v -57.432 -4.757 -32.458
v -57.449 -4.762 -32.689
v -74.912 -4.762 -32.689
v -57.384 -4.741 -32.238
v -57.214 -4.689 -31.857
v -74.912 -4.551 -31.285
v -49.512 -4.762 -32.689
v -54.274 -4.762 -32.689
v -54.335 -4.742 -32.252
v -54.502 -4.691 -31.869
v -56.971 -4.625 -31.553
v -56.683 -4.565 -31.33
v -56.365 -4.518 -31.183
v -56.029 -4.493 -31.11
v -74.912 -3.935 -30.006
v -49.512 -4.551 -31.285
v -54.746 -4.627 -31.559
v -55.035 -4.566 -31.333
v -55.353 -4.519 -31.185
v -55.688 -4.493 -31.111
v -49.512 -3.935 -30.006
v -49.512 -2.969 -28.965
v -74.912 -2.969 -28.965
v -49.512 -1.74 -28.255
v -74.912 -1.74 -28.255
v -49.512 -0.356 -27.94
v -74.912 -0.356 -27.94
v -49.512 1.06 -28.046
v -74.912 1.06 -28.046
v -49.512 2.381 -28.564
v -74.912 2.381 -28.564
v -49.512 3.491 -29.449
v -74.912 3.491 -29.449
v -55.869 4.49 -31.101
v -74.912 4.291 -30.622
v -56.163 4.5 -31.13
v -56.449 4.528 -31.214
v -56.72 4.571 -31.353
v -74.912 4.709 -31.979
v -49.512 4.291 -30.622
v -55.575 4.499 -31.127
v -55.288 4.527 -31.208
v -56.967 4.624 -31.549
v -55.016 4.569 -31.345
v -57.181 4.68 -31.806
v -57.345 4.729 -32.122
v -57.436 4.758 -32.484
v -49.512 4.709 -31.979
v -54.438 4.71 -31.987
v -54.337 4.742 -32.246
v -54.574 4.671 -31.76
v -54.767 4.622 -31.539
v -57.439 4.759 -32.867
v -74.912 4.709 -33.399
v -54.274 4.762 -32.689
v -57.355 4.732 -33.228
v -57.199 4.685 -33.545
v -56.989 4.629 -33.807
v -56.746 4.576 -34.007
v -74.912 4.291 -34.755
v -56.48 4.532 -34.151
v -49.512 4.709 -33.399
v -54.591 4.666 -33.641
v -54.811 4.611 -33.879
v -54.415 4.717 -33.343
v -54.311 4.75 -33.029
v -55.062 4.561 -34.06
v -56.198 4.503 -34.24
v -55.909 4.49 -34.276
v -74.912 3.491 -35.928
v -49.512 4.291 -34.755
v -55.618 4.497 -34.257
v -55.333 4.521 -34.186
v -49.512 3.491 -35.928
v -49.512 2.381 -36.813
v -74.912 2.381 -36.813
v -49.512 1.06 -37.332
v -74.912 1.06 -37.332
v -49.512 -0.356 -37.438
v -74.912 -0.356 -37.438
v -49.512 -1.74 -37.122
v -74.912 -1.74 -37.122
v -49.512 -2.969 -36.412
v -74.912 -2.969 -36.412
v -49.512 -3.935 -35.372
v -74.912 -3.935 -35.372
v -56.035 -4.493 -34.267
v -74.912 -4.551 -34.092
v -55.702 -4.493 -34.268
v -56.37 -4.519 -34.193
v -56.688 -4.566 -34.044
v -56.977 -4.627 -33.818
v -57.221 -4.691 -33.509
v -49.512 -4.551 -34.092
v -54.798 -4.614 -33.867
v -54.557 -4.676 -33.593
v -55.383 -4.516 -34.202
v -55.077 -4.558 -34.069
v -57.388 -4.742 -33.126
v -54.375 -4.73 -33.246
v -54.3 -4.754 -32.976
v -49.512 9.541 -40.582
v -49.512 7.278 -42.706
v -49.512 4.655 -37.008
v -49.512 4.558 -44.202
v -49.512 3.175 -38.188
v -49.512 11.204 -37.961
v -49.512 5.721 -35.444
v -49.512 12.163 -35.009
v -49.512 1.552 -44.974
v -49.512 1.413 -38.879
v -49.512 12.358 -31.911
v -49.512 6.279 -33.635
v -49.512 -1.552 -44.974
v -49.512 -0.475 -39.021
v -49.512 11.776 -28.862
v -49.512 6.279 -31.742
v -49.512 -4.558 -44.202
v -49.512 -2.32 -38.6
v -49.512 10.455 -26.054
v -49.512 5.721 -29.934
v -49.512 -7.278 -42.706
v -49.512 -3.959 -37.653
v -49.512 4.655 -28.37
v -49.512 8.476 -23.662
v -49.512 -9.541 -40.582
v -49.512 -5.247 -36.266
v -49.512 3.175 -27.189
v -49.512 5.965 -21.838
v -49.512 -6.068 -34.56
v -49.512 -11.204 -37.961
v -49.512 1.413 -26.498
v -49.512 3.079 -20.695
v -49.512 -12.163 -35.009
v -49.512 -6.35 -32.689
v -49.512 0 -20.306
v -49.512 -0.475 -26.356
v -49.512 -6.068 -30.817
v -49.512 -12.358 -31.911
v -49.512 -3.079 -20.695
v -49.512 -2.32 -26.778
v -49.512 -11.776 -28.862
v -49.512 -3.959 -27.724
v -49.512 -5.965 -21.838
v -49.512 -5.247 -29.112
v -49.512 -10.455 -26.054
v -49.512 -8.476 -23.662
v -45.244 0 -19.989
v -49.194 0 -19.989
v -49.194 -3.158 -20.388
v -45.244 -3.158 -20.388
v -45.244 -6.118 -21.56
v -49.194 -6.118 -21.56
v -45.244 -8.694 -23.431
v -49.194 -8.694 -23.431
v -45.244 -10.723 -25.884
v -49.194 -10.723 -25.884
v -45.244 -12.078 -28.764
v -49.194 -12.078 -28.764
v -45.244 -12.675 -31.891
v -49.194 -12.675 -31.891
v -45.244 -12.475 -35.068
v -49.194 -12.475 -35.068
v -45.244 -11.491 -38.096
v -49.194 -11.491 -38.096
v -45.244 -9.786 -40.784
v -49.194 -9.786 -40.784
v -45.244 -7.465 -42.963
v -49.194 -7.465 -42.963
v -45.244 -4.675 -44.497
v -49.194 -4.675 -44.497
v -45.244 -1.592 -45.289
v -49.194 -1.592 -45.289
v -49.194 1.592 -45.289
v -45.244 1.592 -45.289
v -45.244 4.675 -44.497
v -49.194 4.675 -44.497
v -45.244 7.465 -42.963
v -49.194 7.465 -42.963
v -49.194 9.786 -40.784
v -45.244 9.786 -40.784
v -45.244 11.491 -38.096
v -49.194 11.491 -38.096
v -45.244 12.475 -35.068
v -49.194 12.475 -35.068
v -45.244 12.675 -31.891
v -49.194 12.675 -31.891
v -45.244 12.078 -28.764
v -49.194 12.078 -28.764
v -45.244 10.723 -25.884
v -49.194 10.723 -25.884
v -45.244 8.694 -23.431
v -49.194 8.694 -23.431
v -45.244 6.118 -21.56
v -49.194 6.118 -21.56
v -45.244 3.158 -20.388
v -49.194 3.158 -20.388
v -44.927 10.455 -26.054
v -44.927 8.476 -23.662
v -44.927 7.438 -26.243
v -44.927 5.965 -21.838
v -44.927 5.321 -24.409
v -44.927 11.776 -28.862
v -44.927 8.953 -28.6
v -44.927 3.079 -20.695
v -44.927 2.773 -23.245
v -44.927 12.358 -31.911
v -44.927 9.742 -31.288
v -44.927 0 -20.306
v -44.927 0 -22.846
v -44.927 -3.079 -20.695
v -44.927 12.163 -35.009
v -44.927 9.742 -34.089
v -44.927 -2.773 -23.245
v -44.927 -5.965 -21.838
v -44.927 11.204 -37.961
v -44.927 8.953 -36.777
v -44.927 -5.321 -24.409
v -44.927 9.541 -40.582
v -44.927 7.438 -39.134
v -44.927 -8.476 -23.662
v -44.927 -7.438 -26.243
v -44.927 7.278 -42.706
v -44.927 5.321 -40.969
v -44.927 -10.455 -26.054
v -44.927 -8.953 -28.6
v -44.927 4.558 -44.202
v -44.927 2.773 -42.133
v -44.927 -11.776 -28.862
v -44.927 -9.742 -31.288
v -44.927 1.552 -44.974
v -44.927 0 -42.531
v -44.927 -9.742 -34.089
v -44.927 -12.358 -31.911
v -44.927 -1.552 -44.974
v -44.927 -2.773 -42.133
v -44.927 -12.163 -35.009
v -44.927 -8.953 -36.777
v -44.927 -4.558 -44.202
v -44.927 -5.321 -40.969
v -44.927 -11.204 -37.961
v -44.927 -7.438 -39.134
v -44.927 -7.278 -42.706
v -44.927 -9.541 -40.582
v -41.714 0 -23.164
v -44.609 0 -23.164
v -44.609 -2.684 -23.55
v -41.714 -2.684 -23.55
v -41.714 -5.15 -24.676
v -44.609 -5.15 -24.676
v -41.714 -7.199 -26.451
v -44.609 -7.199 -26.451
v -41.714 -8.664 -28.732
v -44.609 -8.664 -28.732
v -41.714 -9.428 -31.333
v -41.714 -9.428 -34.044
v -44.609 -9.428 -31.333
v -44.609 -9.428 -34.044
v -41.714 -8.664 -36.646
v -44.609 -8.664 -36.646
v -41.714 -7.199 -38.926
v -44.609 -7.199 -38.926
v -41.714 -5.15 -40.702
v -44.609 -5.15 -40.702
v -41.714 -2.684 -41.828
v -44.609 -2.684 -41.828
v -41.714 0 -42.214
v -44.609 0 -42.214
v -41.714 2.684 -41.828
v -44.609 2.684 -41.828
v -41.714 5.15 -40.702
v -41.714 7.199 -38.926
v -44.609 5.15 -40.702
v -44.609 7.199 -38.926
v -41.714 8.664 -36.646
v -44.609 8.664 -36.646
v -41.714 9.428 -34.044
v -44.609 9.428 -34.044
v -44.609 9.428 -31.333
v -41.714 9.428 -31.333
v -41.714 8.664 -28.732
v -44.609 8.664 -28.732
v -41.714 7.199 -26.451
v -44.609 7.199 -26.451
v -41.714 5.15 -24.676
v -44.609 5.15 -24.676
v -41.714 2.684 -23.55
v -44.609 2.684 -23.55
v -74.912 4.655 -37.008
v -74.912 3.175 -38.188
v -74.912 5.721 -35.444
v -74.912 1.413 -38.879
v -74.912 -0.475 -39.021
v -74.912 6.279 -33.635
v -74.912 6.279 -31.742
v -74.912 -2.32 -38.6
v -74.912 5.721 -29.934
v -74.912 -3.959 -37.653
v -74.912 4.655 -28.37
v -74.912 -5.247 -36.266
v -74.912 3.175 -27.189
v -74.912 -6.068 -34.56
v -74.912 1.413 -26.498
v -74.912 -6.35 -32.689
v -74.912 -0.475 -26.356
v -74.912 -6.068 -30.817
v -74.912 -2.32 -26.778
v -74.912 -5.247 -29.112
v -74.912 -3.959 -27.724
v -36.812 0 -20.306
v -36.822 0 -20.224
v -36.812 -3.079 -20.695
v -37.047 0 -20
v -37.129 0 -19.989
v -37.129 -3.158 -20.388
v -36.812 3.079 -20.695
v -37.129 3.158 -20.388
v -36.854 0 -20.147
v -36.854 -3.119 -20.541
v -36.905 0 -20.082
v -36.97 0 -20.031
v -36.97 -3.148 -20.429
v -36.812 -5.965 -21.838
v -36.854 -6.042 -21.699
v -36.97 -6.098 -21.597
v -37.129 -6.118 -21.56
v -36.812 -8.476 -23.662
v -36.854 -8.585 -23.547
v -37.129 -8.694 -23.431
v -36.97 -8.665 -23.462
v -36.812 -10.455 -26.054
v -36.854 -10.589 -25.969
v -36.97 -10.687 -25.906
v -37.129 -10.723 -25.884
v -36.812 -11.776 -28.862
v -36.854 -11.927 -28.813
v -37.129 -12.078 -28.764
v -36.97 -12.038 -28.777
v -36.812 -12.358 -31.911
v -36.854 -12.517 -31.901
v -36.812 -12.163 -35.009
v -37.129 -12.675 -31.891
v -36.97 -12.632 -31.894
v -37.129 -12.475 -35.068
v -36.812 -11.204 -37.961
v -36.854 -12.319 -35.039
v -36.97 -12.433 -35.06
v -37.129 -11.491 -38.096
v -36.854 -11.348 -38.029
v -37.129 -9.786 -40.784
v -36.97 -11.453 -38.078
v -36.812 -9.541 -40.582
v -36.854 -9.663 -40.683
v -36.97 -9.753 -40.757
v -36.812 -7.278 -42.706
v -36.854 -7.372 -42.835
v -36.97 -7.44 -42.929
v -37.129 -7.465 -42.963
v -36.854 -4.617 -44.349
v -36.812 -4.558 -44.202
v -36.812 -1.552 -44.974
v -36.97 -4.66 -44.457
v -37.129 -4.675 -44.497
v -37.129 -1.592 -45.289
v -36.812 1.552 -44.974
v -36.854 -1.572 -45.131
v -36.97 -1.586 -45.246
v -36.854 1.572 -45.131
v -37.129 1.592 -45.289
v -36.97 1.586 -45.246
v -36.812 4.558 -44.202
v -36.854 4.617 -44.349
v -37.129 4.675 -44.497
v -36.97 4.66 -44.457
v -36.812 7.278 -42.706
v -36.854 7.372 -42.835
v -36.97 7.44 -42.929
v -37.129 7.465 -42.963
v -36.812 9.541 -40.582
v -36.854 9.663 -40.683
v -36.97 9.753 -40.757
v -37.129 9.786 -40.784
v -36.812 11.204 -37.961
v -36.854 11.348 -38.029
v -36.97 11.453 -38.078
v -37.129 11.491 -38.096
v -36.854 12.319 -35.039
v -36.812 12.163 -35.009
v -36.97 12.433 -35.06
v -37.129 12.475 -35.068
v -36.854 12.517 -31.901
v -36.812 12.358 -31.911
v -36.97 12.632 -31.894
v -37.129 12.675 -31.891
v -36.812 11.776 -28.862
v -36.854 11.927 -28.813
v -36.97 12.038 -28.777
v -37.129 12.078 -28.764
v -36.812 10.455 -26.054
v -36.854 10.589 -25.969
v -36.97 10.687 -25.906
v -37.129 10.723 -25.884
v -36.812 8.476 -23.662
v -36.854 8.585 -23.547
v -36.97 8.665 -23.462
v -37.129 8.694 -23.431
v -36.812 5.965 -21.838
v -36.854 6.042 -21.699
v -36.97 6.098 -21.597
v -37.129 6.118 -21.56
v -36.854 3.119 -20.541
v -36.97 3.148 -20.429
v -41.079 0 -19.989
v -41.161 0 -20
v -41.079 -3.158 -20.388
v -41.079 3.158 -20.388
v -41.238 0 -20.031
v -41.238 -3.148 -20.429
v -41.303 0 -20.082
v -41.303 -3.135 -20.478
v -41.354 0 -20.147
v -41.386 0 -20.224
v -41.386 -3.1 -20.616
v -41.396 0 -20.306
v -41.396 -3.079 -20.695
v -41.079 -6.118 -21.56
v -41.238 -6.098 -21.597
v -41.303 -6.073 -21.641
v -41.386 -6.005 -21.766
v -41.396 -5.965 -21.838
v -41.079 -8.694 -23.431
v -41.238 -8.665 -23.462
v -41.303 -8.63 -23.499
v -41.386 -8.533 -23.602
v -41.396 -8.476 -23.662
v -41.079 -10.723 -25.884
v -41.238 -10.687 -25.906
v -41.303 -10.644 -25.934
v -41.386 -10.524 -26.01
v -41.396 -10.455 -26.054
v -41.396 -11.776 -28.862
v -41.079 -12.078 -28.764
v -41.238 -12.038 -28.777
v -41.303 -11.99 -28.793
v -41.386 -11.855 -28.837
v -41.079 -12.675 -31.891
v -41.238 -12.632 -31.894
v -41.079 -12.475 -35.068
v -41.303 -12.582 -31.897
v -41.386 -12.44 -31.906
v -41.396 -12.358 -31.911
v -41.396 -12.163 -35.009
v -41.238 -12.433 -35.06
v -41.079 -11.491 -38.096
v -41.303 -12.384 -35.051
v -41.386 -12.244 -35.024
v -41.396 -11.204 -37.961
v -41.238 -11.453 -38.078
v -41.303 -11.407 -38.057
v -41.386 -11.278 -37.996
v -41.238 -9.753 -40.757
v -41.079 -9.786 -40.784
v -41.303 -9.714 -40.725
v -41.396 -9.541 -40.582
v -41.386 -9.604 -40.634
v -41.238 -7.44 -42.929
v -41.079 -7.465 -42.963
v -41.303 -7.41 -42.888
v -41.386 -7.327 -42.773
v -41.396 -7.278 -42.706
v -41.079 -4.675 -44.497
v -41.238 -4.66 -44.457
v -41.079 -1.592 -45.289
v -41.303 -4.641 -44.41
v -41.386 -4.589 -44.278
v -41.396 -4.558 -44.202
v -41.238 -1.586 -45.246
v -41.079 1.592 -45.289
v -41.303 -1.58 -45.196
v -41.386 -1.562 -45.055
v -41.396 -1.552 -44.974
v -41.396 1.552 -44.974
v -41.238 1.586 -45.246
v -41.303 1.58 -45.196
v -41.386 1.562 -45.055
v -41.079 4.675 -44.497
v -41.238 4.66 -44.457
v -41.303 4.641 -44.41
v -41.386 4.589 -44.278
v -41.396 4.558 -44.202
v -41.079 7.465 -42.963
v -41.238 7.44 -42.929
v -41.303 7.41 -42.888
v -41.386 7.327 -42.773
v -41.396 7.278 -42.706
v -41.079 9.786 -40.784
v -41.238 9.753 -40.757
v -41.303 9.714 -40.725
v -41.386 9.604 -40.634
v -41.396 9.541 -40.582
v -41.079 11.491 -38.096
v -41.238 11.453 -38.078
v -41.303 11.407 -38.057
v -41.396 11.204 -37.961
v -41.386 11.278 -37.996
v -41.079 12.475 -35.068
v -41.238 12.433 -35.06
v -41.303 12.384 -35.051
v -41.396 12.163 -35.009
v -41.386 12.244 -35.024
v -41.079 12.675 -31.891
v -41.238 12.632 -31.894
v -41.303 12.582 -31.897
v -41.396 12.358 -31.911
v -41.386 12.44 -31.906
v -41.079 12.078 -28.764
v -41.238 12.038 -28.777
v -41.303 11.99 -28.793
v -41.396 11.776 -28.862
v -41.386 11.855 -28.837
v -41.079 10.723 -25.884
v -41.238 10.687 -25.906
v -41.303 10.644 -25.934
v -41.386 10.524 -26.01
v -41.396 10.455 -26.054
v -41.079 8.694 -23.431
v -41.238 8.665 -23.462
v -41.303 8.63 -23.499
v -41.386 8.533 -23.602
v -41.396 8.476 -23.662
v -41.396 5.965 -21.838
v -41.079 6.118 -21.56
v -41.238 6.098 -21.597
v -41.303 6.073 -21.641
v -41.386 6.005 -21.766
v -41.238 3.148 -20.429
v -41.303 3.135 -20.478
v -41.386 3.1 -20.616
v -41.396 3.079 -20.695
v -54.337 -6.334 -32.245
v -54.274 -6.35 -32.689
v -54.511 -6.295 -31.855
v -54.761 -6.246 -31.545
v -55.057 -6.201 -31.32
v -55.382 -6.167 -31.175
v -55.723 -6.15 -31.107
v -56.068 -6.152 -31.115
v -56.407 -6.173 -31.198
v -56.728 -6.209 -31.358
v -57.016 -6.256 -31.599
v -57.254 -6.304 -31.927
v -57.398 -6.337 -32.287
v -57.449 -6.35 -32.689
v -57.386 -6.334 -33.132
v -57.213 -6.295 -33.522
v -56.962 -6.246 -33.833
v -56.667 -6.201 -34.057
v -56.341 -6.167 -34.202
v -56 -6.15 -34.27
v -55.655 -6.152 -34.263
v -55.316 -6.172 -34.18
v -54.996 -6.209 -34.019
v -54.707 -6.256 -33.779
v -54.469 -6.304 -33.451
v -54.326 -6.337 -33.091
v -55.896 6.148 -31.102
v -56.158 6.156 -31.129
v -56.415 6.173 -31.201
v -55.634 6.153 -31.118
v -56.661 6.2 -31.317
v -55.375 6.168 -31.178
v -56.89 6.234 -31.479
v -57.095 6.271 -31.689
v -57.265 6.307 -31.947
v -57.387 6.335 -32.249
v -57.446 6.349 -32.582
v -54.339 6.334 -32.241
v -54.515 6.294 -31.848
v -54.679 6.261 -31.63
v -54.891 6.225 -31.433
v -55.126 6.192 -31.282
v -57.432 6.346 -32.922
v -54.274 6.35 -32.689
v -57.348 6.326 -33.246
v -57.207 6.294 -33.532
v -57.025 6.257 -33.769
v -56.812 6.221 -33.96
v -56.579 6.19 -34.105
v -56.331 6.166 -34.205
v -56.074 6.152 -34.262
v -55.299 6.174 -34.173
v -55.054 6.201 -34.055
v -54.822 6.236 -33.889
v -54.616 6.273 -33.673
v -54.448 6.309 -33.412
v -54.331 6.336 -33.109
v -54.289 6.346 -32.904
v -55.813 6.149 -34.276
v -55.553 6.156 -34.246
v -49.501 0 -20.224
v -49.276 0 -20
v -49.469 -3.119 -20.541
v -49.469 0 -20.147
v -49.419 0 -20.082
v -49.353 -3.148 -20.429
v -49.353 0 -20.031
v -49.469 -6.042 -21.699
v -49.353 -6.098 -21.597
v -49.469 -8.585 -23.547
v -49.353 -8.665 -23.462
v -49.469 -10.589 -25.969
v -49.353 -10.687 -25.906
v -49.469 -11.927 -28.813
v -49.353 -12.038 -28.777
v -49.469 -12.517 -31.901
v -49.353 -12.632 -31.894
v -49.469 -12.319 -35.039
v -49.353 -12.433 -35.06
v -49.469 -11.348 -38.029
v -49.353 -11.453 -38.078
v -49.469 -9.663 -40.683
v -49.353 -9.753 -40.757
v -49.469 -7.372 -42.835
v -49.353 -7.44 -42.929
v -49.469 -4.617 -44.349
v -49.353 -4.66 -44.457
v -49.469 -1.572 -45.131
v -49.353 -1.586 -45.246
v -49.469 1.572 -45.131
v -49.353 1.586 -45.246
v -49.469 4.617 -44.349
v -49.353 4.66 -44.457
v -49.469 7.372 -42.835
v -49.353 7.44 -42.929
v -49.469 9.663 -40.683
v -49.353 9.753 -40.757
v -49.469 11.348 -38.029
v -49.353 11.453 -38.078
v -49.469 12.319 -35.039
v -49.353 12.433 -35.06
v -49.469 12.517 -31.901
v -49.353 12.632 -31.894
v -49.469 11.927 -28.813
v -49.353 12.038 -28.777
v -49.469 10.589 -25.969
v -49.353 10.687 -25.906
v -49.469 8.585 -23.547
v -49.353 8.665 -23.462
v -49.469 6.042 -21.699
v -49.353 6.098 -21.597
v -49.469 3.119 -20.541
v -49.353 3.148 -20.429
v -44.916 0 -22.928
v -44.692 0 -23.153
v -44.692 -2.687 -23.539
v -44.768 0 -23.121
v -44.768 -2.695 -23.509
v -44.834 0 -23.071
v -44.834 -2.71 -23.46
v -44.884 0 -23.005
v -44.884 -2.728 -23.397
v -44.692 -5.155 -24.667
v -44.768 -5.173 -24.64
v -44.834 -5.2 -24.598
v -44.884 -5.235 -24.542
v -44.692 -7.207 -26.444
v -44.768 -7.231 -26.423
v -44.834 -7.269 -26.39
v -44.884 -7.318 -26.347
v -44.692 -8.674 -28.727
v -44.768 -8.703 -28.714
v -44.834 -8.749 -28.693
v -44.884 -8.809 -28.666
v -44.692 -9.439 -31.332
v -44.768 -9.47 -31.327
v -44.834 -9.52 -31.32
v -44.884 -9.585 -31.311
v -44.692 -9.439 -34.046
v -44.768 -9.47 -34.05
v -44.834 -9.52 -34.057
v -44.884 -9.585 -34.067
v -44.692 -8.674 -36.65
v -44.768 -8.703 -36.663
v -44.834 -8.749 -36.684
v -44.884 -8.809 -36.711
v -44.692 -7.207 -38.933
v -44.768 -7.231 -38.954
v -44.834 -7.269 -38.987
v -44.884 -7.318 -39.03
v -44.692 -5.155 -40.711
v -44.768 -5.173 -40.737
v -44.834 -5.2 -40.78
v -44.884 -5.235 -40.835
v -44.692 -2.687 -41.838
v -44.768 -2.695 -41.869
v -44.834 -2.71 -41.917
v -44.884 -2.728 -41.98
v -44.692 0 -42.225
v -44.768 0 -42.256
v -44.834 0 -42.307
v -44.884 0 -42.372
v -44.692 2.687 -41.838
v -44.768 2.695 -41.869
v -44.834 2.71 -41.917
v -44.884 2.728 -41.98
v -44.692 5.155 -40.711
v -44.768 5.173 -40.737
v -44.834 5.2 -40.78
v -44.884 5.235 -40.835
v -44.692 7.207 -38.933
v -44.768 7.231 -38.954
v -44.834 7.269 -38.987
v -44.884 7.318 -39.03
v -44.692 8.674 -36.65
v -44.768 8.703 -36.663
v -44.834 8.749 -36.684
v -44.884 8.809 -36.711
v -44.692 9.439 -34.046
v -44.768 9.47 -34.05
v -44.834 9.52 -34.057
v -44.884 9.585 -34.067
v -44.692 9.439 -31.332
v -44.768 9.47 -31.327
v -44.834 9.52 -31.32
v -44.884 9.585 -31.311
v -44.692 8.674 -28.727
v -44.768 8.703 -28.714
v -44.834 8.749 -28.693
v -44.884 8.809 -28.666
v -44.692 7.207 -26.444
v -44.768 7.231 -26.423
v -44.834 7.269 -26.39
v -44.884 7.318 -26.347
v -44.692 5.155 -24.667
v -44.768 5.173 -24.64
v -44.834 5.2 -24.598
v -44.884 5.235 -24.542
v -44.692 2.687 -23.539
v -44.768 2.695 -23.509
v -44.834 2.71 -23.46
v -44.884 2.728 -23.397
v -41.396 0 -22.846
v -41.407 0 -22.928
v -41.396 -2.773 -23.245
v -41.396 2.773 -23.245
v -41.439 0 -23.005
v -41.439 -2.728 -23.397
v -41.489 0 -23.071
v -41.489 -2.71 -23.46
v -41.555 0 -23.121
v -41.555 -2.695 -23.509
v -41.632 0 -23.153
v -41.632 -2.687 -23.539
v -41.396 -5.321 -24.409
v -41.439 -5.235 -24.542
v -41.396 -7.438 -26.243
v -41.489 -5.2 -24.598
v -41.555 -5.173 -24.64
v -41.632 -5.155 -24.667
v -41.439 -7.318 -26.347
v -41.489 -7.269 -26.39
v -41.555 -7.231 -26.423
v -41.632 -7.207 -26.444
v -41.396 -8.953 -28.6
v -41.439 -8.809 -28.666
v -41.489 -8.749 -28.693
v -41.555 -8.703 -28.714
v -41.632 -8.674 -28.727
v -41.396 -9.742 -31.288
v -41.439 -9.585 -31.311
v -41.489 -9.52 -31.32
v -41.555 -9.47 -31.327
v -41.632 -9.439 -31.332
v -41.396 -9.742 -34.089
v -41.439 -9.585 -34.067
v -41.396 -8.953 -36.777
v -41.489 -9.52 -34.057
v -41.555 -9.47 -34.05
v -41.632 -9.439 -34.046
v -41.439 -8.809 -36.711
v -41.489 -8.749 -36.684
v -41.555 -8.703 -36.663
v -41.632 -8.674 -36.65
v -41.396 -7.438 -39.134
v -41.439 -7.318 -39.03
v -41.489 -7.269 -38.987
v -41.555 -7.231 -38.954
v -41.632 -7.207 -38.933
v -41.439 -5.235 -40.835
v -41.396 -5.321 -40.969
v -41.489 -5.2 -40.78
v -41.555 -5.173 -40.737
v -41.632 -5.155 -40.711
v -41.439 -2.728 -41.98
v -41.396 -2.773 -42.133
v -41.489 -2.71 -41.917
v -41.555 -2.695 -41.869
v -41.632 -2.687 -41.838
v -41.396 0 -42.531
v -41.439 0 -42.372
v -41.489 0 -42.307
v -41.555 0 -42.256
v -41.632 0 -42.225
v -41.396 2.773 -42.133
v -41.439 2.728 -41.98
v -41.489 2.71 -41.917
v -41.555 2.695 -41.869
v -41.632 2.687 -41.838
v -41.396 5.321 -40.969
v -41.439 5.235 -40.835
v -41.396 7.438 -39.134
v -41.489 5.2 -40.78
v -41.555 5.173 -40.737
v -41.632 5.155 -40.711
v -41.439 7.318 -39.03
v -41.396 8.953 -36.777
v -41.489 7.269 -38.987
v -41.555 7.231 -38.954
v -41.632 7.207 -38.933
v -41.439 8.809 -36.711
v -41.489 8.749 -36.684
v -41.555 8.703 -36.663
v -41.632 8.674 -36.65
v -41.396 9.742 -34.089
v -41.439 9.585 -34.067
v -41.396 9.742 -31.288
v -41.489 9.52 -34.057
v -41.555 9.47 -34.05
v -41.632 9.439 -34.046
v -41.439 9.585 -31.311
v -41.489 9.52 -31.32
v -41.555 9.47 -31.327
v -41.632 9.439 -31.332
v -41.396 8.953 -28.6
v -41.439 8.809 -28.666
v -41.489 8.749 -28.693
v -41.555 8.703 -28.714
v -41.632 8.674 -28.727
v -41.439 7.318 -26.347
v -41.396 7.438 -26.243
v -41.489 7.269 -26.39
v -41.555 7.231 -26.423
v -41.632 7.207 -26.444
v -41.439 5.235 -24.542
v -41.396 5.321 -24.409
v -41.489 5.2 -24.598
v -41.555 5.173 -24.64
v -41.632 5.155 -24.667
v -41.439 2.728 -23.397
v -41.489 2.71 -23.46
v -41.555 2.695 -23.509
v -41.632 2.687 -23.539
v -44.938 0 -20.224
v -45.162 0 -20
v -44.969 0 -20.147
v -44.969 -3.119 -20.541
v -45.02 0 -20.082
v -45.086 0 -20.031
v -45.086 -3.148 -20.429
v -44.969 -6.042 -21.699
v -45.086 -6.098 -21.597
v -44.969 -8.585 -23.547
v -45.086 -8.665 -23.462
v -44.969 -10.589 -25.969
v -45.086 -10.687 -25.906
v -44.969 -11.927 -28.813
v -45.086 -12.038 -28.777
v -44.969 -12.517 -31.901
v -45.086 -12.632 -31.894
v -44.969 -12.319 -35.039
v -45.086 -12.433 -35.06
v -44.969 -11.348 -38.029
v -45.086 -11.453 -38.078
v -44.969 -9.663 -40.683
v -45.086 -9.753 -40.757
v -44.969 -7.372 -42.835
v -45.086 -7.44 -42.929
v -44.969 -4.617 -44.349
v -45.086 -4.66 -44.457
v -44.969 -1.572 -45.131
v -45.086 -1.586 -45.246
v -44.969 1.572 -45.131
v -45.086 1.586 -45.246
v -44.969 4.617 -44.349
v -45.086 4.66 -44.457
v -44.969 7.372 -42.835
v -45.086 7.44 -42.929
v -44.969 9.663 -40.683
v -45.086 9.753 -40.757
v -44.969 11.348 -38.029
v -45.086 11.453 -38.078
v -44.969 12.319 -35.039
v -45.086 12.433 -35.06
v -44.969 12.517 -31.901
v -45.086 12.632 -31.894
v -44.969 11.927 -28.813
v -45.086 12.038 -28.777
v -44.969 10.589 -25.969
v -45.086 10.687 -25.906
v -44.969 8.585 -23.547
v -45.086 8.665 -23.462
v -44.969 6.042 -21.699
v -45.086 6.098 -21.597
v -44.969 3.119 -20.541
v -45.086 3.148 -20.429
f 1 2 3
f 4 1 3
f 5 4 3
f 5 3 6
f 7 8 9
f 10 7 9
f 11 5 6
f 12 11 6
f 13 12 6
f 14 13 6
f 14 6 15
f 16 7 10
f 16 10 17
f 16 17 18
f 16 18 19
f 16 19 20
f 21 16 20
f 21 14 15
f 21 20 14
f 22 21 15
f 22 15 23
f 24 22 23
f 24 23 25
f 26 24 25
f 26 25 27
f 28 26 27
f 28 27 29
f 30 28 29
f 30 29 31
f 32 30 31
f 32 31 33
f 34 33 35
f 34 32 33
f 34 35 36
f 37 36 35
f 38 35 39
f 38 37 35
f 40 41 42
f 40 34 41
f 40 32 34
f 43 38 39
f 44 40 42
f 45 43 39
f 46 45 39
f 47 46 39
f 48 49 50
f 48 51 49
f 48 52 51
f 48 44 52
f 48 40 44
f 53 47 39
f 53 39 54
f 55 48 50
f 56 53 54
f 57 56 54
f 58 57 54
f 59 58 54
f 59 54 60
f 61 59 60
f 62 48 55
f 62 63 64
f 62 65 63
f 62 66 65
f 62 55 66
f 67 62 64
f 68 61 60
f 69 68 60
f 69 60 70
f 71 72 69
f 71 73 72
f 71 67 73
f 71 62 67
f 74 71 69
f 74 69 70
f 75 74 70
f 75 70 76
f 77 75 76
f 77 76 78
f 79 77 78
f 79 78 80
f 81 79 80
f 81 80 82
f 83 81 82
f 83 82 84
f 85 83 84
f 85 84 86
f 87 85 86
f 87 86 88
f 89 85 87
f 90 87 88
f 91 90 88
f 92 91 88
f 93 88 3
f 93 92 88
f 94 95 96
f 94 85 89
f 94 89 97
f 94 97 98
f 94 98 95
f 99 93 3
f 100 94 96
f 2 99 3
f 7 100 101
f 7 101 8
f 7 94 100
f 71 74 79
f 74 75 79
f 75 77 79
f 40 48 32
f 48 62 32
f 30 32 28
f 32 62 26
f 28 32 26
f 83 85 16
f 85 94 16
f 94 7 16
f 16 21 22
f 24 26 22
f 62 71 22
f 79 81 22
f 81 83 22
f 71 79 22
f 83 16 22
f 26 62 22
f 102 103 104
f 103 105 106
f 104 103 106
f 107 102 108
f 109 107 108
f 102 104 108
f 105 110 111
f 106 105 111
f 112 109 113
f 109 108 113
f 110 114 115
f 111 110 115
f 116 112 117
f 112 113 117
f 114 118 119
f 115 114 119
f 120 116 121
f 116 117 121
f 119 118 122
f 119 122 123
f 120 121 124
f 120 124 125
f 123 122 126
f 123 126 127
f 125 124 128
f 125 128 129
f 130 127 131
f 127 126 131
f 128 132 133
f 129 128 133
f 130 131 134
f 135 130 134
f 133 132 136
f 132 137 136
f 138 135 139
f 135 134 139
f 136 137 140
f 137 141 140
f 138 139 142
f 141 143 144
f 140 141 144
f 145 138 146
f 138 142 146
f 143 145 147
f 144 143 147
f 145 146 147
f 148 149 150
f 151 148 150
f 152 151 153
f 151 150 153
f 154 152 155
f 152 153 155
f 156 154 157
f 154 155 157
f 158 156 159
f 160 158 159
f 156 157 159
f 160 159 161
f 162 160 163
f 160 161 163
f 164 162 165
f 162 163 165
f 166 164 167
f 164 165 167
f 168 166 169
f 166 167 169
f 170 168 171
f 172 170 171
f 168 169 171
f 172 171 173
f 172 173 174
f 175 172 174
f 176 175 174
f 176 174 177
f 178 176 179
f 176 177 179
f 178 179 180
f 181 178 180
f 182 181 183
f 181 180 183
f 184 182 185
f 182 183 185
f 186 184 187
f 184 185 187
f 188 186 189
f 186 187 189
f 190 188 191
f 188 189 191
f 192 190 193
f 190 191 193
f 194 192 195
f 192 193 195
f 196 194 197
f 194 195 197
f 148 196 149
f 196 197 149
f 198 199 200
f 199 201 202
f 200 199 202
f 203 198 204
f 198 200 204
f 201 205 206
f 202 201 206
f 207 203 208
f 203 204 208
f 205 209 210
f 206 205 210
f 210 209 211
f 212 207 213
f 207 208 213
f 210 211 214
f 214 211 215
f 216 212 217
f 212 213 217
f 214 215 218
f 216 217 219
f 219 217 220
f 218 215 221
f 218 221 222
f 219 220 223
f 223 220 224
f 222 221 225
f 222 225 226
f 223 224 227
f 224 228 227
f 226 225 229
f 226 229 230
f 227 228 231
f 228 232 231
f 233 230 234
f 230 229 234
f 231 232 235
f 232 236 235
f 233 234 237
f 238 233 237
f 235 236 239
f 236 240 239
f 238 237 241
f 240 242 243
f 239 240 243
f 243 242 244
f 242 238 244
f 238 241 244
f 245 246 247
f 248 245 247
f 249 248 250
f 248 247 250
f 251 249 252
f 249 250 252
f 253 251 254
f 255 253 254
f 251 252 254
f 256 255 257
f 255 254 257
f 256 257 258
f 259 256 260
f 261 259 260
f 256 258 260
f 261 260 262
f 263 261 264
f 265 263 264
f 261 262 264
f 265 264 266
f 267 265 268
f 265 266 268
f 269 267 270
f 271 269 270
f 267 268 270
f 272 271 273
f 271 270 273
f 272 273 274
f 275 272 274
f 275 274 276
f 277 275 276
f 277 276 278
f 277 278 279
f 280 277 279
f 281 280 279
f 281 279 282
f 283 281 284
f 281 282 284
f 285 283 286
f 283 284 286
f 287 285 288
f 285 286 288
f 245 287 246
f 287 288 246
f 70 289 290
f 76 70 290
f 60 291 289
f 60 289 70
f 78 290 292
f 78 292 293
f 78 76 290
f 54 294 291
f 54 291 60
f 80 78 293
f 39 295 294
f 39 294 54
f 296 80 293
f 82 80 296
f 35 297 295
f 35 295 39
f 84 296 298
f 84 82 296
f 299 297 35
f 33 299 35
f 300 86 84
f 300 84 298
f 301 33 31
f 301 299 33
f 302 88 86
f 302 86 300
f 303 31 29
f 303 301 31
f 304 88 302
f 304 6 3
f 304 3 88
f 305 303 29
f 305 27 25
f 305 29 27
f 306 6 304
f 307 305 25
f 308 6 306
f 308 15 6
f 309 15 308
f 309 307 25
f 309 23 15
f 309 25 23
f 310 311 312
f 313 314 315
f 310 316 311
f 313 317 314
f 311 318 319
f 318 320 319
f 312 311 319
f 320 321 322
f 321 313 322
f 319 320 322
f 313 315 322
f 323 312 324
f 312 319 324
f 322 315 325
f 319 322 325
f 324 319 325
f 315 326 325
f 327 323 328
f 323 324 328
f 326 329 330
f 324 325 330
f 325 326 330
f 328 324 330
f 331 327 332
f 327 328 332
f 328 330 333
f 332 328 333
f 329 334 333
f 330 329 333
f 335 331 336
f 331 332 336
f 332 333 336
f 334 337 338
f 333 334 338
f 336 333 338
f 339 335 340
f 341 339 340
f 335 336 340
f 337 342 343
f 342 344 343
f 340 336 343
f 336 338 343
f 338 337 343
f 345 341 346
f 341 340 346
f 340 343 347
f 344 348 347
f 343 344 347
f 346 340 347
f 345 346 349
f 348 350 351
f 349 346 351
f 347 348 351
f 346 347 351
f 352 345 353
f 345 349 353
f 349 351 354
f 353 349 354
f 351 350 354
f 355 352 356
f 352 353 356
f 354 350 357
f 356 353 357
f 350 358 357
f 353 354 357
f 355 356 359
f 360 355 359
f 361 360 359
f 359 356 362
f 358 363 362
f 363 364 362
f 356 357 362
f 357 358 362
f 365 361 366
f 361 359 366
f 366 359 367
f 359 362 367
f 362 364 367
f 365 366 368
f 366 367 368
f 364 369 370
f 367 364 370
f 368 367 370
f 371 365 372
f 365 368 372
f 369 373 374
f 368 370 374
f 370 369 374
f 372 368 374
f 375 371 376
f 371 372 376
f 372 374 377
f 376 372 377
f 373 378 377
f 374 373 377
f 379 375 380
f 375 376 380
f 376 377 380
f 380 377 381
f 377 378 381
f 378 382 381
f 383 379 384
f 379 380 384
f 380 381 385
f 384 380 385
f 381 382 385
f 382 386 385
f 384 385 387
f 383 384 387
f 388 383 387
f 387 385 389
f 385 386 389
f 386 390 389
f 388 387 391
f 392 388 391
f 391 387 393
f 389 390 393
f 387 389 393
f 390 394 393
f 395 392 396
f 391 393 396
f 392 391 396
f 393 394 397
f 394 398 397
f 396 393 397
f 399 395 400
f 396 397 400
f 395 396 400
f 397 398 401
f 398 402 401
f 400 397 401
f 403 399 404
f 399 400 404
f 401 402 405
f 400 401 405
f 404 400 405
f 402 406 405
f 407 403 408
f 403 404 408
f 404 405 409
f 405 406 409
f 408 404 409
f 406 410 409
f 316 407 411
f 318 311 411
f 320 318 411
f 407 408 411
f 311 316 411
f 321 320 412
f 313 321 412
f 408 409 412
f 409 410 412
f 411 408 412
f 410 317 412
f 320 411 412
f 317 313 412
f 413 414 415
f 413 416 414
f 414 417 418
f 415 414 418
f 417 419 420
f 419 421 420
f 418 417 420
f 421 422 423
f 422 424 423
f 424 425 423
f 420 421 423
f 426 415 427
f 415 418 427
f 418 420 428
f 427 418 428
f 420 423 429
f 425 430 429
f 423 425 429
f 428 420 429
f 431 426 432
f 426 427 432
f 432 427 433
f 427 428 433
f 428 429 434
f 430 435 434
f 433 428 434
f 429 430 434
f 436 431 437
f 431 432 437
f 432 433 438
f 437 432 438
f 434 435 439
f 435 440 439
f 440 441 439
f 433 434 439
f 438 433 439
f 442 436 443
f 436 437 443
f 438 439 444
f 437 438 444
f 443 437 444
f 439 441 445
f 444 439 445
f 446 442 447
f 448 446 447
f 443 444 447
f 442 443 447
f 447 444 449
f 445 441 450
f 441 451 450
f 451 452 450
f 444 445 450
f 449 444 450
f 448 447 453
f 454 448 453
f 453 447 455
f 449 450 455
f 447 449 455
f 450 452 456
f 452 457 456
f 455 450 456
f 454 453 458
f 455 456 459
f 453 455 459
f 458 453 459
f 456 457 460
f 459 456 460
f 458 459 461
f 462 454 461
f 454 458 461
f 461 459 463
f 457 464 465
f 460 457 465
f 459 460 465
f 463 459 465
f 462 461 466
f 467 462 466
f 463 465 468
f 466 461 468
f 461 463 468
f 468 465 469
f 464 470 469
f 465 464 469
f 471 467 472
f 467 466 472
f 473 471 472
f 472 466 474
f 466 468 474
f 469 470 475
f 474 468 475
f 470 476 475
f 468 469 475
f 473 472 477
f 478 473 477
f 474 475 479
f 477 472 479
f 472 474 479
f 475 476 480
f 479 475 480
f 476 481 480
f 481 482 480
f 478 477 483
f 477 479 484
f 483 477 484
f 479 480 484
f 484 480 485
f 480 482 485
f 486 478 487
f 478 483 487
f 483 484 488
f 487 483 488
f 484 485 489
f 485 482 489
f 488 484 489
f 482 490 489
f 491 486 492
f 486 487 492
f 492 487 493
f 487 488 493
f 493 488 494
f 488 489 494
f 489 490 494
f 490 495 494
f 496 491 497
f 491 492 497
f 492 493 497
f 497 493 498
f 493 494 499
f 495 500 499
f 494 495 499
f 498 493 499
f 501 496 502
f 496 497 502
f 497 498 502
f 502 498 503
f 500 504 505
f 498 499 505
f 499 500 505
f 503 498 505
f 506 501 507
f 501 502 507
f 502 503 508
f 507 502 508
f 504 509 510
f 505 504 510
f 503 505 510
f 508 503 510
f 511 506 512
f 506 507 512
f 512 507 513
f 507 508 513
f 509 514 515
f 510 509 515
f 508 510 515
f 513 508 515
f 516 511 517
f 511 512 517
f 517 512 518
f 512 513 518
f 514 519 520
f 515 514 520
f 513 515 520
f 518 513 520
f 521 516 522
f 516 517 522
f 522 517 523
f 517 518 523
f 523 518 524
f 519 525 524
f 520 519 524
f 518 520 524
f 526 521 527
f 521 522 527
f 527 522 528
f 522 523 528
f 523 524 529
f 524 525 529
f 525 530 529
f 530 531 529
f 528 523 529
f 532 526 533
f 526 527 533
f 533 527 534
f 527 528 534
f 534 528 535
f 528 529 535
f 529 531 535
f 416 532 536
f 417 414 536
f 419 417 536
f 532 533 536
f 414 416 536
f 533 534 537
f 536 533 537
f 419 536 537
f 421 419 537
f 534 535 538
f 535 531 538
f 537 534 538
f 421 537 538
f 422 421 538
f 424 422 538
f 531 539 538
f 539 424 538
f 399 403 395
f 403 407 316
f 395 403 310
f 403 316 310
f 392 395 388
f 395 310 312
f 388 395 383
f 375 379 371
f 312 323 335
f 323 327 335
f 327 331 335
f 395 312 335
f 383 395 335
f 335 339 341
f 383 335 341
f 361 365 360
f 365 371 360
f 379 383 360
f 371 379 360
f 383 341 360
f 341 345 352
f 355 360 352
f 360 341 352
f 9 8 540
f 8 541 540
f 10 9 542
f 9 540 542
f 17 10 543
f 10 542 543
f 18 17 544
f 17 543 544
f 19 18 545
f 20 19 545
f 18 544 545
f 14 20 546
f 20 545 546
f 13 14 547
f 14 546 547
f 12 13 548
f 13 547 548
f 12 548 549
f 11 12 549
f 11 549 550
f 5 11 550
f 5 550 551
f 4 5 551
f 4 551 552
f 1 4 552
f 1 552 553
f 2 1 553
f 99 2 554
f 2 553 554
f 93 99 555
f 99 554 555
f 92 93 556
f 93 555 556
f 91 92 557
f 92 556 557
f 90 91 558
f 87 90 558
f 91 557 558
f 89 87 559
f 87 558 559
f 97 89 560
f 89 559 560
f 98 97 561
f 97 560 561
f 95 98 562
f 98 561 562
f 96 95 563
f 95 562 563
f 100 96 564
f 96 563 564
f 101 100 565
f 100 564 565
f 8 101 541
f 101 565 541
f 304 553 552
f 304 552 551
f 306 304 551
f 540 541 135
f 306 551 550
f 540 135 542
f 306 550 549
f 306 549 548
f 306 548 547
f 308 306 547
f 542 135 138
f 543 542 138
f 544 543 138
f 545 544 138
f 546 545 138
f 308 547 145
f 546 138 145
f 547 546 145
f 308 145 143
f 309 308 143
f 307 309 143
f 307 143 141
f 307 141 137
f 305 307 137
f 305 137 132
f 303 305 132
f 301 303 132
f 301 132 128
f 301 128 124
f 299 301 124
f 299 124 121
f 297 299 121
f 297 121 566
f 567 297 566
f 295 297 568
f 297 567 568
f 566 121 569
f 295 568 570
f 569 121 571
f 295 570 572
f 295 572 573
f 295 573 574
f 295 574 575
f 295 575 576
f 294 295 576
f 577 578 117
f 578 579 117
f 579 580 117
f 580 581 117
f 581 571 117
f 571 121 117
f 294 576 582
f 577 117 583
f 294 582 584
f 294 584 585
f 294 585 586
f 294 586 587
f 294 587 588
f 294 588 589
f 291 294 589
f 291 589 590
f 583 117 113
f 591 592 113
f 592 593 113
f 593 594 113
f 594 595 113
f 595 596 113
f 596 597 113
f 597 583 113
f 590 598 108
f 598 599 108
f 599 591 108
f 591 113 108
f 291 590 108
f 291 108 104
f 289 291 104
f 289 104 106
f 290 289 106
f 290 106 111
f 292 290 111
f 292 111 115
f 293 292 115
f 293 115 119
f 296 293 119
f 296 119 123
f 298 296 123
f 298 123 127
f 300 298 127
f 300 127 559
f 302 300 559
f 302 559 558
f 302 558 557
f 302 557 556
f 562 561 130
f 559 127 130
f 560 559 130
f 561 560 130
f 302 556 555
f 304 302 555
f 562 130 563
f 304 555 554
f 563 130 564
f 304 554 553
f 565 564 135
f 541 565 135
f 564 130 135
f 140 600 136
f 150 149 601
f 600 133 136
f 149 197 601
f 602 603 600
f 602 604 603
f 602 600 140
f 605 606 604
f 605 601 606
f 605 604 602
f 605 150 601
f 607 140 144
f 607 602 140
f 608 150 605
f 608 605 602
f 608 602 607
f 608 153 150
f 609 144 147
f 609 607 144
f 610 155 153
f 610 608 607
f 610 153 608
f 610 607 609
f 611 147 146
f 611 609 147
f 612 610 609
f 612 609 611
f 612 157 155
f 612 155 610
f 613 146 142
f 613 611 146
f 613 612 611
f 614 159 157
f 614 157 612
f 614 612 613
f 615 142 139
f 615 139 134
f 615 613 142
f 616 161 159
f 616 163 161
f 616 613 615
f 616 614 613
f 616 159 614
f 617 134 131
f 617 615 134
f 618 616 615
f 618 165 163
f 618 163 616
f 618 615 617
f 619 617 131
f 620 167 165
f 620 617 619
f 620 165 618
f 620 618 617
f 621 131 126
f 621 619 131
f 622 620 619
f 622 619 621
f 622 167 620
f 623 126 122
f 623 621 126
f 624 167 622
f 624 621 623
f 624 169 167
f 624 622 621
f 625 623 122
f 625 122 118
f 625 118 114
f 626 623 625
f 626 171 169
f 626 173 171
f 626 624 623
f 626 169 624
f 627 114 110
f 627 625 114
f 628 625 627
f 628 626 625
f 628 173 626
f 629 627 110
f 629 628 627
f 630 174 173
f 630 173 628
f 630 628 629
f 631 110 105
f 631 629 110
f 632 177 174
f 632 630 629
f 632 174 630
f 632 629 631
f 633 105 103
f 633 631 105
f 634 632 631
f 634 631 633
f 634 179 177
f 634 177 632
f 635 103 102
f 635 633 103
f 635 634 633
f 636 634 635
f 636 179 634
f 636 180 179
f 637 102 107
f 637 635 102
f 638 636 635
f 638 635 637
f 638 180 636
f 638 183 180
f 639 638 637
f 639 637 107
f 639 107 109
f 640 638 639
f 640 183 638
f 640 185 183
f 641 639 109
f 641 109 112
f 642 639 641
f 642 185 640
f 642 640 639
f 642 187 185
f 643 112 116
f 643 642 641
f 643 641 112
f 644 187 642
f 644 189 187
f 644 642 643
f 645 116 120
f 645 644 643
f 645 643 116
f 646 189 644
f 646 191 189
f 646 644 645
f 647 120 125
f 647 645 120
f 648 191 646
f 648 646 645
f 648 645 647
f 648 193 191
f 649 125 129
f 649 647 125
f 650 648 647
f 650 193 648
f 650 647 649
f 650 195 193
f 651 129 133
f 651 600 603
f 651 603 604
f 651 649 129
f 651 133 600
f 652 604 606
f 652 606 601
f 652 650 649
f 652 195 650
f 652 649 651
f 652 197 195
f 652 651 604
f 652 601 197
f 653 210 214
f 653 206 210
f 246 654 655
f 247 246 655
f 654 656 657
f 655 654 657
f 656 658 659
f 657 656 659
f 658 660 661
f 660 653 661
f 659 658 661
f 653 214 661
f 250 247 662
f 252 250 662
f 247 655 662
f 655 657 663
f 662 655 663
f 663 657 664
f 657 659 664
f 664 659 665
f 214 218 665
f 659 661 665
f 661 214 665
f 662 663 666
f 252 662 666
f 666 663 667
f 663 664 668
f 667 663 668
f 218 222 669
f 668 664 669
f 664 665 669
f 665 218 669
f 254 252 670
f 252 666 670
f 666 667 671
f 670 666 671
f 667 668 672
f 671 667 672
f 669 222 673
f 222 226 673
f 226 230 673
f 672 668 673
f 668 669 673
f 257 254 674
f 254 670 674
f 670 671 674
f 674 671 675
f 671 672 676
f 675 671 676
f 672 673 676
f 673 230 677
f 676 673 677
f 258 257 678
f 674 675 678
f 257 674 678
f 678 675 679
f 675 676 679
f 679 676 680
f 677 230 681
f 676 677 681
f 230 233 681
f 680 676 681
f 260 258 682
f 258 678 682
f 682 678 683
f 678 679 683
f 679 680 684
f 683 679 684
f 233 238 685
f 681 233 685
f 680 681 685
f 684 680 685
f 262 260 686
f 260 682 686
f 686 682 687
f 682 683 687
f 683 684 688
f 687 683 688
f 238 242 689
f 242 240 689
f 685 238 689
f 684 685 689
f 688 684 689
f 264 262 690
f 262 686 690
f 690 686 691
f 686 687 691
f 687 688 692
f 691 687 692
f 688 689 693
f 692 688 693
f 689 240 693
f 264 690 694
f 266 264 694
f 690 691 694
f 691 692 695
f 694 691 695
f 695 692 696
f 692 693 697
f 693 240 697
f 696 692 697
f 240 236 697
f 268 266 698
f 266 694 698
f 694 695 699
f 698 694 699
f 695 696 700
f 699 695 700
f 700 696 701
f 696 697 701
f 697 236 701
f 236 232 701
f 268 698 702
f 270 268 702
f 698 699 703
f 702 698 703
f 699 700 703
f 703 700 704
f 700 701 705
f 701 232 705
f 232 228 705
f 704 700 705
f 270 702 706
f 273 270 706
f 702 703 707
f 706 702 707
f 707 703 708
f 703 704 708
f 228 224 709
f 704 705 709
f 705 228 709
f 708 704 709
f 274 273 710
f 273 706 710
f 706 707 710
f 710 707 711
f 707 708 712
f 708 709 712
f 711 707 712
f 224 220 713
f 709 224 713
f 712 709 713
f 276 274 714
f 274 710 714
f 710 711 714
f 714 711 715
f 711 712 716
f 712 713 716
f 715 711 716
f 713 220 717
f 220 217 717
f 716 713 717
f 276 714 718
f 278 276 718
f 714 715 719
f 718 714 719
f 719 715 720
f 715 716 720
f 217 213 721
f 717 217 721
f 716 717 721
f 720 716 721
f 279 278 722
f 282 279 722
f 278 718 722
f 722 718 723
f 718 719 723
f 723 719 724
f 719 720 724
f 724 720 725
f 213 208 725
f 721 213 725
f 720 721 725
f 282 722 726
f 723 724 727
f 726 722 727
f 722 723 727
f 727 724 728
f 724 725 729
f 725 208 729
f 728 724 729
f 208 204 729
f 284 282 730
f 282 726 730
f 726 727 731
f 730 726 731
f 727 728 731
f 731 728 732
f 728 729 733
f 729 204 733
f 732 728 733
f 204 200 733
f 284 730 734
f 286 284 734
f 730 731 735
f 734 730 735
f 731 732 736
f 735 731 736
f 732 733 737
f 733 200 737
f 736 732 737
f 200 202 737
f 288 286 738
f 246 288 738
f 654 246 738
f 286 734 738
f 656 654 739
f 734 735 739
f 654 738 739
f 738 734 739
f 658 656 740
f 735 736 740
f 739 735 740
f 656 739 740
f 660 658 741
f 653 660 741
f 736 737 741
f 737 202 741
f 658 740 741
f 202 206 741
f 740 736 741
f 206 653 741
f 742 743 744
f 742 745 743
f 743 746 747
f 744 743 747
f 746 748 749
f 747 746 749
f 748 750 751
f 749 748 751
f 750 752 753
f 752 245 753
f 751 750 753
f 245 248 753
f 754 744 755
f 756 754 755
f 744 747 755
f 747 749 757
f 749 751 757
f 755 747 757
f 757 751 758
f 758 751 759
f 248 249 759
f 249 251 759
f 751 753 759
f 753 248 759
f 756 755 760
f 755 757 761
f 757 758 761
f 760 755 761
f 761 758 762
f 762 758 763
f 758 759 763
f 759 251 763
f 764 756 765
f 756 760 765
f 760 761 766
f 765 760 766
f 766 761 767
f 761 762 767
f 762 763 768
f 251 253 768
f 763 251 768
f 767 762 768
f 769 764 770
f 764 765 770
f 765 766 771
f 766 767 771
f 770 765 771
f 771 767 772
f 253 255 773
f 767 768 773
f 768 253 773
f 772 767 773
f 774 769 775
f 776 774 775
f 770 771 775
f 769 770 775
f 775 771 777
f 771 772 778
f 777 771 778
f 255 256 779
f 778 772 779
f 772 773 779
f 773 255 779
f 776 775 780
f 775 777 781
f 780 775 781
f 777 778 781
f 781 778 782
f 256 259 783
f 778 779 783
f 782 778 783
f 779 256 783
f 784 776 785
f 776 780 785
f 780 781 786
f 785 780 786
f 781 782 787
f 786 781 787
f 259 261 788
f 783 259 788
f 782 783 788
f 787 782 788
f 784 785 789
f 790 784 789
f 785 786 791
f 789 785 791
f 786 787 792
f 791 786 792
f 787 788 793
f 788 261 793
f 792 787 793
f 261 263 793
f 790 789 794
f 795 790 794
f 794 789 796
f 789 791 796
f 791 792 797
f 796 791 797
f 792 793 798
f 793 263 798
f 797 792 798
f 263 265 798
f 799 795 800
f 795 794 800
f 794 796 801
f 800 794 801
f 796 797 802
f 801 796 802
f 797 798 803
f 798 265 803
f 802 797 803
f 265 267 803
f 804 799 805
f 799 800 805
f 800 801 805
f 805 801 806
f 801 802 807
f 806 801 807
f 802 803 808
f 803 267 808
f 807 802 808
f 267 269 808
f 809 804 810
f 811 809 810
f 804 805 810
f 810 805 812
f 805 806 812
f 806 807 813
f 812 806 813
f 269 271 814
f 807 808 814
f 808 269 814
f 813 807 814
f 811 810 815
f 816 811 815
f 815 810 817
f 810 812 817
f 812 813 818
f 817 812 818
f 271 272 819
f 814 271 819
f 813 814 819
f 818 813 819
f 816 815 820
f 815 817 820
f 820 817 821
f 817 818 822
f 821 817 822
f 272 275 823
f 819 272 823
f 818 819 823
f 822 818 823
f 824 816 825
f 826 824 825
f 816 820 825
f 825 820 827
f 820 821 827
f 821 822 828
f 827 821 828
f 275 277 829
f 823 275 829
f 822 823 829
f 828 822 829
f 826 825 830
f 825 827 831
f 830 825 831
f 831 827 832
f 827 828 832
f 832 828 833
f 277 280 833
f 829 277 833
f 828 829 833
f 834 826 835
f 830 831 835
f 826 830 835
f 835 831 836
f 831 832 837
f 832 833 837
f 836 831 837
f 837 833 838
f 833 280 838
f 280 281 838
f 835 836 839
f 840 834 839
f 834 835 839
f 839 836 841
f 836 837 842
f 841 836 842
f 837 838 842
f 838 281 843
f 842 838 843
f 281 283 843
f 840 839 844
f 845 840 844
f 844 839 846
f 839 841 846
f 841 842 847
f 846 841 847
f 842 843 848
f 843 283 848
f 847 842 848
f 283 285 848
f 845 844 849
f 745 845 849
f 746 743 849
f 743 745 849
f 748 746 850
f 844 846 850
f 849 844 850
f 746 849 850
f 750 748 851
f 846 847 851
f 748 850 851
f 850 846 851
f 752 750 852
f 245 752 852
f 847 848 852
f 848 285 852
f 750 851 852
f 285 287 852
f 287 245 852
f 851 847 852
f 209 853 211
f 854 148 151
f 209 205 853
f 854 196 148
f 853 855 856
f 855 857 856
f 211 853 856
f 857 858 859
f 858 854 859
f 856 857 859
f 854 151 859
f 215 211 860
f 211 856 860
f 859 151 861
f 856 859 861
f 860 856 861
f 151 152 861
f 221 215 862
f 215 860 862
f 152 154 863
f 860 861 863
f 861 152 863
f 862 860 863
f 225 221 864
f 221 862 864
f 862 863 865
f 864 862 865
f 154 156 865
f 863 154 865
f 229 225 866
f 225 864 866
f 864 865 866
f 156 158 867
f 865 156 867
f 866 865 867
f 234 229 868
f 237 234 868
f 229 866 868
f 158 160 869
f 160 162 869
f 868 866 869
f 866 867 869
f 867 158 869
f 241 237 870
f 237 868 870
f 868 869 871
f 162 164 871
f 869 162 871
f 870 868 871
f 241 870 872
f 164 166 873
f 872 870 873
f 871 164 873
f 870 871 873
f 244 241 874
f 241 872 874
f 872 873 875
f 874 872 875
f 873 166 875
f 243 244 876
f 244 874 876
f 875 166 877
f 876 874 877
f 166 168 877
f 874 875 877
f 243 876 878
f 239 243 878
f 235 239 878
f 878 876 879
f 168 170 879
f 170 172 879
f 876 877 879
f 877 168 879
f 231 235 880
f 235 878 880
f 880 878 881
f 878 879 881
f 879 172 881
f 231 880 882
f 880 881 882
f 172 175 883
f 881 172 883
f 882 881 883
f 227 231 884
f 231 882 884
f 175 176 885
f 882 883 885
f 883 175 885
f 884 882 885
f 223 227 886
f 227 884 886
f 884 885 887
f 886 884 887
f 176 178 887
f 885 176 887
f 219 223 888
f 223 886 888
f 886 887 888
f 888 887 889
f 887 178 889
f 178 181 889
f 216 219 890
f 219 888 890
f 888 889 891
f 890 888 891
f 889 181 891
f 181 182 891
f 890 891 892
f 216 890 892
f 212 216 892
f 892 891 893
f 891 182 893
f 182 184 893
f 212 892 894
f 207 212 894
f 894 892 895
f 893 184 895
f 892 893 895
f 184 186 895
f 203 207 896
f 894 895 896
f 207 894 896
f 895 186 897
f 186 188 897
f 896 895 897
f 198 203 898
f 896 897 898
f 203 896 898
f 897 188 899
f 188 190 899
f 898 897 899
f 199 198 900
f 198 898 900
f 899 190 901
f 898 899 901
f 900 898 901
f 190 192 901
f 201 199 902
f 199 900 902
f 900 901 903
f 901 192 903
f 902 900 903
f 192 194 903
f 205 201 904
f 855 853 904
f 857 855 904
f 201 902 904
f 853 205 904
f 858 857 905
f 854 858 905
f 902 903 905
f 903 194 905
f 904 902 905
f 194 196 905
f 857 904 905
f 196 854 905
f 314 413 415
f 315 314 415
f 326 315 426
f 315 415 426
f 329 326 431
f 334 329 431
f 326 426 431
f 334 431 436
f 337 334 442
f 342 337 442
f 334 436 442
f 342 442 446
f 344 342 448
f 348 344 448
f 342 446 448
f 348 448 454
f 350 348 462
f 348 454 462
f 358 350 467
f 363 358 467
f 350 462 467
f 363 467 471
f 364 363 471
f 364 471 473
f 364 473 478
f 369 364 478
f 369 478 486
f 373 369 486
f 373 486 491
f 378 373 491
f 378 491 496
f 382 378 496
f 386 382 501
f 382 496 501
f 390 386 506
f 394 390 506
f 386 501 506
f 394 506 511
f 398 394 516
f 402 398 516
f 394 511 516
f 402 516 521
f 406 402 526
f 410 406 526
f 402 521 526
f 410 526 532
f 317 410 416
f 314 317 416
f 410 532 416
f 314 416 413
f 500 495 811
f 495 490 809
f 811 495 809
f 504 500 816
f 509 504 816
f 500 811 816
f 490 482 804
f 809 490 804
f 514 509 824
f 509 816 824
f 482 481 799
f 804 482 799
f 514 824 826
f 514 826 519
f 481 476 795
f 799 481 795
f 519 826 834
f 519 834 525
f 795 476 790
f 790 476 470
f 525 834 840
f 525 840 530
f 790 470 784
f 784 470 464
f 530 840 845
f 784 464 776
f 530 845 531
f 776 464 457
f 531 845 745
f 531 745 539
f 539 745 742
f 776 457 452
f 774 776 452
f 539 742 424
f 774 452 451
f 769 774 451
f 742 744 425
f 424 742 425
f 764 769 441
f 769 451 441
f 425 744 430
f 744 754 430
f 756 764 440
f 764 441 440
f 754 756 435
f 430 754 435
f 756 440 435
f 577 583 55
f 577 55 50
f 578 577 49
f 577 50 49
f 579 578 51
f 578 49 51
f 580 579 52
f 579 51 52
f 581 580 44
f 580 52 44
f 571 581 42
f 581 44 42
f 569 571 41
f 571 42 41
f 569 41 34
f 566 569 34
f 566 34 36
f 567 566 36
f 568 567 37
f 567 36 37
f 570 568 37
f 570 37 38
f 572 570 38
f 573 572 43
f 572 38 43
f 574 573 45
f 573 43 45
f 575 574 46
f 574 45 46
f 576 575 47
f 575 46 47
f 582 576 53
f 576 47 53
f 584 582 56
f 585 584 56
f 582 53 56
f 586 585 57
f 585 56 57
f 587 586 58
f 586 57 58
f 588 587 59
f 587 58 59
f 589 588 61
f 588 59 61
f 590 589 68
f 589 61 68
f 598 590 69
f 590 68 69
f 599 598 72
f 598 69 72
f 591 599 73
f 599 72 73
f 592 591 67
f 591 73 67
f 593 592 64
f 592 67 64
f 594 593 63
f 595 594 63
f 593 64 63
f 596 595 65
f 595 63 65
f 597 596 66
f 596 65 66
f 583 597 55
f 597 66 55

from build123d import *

# Parameters (mm, degrees)
F2_R     = 0.3175
F3_R     = 6.35
F3_R_2   = 4.7625
F4_DEPTH = 25.4
F5_R     = 1.5875
F6_DEPTH = 12.7


with BuildPart() as f1:
    # F0 (on Front) → F1 (revolve)
    with BuildSketch(Plane.XZ):
        Polygon((-49.5116594105, -19.9887029331), (-49.5116594105, -32.6887029331), (-36.8116594105, -32.6887029331), (-36.8116594105, -19.9887029331), (-41.3963594105, -19.9887029331), (-41.3963594105, -23.1637029331), (-44.9269594105, -23.1637029331), (-44.9269594105, -19.9887029331), align=None)
    revolve(axis=Axis((-43.1616594105, 0, -32.6887029331), (1, 0, 0)))

    # F2
    f2_edges = [f1.edges().sort_by_distance(p)[0] for p in [
        (-36.811659, 0, -45.388703),
        (-41.396359, 0, -45.388703),
        (-44.926959, 0, -45.388703),
        (-49.511659, 0, -45.388703),
        (-44.926959, 0, -42.213703),
        (-41.396359, 0, -42.213703),
    ]]
    fillet(f2_edges, radius=F2_R)

    # F3 (on face) → F4 (join)
    with BuildSketch(Plane(origin=(-49.5116594105, 0, 0), x_dir=(0, -1, 0), z_dir=(-1, 0, 0))):
        with Locations((0, -32.6887029331)):
            Circle(F3_R)
        with Locations((0, -32.6887029331)):
            Circle(F3_R_2, mode=Mode.SUBTRACT)
    extrude(amount=F4_DEPTH)

    # F5 (on Front) → F6 (cut, symmetric)
    with BuildSketch(Plane.XZ):
        with Locations((-55.8616594105, -32.6887629926)):
            Circle(F5_R)
    extrude(amount=F6_DEPTH, both=True, mode=Mode.SUBTRACT)


solid = f1.part
